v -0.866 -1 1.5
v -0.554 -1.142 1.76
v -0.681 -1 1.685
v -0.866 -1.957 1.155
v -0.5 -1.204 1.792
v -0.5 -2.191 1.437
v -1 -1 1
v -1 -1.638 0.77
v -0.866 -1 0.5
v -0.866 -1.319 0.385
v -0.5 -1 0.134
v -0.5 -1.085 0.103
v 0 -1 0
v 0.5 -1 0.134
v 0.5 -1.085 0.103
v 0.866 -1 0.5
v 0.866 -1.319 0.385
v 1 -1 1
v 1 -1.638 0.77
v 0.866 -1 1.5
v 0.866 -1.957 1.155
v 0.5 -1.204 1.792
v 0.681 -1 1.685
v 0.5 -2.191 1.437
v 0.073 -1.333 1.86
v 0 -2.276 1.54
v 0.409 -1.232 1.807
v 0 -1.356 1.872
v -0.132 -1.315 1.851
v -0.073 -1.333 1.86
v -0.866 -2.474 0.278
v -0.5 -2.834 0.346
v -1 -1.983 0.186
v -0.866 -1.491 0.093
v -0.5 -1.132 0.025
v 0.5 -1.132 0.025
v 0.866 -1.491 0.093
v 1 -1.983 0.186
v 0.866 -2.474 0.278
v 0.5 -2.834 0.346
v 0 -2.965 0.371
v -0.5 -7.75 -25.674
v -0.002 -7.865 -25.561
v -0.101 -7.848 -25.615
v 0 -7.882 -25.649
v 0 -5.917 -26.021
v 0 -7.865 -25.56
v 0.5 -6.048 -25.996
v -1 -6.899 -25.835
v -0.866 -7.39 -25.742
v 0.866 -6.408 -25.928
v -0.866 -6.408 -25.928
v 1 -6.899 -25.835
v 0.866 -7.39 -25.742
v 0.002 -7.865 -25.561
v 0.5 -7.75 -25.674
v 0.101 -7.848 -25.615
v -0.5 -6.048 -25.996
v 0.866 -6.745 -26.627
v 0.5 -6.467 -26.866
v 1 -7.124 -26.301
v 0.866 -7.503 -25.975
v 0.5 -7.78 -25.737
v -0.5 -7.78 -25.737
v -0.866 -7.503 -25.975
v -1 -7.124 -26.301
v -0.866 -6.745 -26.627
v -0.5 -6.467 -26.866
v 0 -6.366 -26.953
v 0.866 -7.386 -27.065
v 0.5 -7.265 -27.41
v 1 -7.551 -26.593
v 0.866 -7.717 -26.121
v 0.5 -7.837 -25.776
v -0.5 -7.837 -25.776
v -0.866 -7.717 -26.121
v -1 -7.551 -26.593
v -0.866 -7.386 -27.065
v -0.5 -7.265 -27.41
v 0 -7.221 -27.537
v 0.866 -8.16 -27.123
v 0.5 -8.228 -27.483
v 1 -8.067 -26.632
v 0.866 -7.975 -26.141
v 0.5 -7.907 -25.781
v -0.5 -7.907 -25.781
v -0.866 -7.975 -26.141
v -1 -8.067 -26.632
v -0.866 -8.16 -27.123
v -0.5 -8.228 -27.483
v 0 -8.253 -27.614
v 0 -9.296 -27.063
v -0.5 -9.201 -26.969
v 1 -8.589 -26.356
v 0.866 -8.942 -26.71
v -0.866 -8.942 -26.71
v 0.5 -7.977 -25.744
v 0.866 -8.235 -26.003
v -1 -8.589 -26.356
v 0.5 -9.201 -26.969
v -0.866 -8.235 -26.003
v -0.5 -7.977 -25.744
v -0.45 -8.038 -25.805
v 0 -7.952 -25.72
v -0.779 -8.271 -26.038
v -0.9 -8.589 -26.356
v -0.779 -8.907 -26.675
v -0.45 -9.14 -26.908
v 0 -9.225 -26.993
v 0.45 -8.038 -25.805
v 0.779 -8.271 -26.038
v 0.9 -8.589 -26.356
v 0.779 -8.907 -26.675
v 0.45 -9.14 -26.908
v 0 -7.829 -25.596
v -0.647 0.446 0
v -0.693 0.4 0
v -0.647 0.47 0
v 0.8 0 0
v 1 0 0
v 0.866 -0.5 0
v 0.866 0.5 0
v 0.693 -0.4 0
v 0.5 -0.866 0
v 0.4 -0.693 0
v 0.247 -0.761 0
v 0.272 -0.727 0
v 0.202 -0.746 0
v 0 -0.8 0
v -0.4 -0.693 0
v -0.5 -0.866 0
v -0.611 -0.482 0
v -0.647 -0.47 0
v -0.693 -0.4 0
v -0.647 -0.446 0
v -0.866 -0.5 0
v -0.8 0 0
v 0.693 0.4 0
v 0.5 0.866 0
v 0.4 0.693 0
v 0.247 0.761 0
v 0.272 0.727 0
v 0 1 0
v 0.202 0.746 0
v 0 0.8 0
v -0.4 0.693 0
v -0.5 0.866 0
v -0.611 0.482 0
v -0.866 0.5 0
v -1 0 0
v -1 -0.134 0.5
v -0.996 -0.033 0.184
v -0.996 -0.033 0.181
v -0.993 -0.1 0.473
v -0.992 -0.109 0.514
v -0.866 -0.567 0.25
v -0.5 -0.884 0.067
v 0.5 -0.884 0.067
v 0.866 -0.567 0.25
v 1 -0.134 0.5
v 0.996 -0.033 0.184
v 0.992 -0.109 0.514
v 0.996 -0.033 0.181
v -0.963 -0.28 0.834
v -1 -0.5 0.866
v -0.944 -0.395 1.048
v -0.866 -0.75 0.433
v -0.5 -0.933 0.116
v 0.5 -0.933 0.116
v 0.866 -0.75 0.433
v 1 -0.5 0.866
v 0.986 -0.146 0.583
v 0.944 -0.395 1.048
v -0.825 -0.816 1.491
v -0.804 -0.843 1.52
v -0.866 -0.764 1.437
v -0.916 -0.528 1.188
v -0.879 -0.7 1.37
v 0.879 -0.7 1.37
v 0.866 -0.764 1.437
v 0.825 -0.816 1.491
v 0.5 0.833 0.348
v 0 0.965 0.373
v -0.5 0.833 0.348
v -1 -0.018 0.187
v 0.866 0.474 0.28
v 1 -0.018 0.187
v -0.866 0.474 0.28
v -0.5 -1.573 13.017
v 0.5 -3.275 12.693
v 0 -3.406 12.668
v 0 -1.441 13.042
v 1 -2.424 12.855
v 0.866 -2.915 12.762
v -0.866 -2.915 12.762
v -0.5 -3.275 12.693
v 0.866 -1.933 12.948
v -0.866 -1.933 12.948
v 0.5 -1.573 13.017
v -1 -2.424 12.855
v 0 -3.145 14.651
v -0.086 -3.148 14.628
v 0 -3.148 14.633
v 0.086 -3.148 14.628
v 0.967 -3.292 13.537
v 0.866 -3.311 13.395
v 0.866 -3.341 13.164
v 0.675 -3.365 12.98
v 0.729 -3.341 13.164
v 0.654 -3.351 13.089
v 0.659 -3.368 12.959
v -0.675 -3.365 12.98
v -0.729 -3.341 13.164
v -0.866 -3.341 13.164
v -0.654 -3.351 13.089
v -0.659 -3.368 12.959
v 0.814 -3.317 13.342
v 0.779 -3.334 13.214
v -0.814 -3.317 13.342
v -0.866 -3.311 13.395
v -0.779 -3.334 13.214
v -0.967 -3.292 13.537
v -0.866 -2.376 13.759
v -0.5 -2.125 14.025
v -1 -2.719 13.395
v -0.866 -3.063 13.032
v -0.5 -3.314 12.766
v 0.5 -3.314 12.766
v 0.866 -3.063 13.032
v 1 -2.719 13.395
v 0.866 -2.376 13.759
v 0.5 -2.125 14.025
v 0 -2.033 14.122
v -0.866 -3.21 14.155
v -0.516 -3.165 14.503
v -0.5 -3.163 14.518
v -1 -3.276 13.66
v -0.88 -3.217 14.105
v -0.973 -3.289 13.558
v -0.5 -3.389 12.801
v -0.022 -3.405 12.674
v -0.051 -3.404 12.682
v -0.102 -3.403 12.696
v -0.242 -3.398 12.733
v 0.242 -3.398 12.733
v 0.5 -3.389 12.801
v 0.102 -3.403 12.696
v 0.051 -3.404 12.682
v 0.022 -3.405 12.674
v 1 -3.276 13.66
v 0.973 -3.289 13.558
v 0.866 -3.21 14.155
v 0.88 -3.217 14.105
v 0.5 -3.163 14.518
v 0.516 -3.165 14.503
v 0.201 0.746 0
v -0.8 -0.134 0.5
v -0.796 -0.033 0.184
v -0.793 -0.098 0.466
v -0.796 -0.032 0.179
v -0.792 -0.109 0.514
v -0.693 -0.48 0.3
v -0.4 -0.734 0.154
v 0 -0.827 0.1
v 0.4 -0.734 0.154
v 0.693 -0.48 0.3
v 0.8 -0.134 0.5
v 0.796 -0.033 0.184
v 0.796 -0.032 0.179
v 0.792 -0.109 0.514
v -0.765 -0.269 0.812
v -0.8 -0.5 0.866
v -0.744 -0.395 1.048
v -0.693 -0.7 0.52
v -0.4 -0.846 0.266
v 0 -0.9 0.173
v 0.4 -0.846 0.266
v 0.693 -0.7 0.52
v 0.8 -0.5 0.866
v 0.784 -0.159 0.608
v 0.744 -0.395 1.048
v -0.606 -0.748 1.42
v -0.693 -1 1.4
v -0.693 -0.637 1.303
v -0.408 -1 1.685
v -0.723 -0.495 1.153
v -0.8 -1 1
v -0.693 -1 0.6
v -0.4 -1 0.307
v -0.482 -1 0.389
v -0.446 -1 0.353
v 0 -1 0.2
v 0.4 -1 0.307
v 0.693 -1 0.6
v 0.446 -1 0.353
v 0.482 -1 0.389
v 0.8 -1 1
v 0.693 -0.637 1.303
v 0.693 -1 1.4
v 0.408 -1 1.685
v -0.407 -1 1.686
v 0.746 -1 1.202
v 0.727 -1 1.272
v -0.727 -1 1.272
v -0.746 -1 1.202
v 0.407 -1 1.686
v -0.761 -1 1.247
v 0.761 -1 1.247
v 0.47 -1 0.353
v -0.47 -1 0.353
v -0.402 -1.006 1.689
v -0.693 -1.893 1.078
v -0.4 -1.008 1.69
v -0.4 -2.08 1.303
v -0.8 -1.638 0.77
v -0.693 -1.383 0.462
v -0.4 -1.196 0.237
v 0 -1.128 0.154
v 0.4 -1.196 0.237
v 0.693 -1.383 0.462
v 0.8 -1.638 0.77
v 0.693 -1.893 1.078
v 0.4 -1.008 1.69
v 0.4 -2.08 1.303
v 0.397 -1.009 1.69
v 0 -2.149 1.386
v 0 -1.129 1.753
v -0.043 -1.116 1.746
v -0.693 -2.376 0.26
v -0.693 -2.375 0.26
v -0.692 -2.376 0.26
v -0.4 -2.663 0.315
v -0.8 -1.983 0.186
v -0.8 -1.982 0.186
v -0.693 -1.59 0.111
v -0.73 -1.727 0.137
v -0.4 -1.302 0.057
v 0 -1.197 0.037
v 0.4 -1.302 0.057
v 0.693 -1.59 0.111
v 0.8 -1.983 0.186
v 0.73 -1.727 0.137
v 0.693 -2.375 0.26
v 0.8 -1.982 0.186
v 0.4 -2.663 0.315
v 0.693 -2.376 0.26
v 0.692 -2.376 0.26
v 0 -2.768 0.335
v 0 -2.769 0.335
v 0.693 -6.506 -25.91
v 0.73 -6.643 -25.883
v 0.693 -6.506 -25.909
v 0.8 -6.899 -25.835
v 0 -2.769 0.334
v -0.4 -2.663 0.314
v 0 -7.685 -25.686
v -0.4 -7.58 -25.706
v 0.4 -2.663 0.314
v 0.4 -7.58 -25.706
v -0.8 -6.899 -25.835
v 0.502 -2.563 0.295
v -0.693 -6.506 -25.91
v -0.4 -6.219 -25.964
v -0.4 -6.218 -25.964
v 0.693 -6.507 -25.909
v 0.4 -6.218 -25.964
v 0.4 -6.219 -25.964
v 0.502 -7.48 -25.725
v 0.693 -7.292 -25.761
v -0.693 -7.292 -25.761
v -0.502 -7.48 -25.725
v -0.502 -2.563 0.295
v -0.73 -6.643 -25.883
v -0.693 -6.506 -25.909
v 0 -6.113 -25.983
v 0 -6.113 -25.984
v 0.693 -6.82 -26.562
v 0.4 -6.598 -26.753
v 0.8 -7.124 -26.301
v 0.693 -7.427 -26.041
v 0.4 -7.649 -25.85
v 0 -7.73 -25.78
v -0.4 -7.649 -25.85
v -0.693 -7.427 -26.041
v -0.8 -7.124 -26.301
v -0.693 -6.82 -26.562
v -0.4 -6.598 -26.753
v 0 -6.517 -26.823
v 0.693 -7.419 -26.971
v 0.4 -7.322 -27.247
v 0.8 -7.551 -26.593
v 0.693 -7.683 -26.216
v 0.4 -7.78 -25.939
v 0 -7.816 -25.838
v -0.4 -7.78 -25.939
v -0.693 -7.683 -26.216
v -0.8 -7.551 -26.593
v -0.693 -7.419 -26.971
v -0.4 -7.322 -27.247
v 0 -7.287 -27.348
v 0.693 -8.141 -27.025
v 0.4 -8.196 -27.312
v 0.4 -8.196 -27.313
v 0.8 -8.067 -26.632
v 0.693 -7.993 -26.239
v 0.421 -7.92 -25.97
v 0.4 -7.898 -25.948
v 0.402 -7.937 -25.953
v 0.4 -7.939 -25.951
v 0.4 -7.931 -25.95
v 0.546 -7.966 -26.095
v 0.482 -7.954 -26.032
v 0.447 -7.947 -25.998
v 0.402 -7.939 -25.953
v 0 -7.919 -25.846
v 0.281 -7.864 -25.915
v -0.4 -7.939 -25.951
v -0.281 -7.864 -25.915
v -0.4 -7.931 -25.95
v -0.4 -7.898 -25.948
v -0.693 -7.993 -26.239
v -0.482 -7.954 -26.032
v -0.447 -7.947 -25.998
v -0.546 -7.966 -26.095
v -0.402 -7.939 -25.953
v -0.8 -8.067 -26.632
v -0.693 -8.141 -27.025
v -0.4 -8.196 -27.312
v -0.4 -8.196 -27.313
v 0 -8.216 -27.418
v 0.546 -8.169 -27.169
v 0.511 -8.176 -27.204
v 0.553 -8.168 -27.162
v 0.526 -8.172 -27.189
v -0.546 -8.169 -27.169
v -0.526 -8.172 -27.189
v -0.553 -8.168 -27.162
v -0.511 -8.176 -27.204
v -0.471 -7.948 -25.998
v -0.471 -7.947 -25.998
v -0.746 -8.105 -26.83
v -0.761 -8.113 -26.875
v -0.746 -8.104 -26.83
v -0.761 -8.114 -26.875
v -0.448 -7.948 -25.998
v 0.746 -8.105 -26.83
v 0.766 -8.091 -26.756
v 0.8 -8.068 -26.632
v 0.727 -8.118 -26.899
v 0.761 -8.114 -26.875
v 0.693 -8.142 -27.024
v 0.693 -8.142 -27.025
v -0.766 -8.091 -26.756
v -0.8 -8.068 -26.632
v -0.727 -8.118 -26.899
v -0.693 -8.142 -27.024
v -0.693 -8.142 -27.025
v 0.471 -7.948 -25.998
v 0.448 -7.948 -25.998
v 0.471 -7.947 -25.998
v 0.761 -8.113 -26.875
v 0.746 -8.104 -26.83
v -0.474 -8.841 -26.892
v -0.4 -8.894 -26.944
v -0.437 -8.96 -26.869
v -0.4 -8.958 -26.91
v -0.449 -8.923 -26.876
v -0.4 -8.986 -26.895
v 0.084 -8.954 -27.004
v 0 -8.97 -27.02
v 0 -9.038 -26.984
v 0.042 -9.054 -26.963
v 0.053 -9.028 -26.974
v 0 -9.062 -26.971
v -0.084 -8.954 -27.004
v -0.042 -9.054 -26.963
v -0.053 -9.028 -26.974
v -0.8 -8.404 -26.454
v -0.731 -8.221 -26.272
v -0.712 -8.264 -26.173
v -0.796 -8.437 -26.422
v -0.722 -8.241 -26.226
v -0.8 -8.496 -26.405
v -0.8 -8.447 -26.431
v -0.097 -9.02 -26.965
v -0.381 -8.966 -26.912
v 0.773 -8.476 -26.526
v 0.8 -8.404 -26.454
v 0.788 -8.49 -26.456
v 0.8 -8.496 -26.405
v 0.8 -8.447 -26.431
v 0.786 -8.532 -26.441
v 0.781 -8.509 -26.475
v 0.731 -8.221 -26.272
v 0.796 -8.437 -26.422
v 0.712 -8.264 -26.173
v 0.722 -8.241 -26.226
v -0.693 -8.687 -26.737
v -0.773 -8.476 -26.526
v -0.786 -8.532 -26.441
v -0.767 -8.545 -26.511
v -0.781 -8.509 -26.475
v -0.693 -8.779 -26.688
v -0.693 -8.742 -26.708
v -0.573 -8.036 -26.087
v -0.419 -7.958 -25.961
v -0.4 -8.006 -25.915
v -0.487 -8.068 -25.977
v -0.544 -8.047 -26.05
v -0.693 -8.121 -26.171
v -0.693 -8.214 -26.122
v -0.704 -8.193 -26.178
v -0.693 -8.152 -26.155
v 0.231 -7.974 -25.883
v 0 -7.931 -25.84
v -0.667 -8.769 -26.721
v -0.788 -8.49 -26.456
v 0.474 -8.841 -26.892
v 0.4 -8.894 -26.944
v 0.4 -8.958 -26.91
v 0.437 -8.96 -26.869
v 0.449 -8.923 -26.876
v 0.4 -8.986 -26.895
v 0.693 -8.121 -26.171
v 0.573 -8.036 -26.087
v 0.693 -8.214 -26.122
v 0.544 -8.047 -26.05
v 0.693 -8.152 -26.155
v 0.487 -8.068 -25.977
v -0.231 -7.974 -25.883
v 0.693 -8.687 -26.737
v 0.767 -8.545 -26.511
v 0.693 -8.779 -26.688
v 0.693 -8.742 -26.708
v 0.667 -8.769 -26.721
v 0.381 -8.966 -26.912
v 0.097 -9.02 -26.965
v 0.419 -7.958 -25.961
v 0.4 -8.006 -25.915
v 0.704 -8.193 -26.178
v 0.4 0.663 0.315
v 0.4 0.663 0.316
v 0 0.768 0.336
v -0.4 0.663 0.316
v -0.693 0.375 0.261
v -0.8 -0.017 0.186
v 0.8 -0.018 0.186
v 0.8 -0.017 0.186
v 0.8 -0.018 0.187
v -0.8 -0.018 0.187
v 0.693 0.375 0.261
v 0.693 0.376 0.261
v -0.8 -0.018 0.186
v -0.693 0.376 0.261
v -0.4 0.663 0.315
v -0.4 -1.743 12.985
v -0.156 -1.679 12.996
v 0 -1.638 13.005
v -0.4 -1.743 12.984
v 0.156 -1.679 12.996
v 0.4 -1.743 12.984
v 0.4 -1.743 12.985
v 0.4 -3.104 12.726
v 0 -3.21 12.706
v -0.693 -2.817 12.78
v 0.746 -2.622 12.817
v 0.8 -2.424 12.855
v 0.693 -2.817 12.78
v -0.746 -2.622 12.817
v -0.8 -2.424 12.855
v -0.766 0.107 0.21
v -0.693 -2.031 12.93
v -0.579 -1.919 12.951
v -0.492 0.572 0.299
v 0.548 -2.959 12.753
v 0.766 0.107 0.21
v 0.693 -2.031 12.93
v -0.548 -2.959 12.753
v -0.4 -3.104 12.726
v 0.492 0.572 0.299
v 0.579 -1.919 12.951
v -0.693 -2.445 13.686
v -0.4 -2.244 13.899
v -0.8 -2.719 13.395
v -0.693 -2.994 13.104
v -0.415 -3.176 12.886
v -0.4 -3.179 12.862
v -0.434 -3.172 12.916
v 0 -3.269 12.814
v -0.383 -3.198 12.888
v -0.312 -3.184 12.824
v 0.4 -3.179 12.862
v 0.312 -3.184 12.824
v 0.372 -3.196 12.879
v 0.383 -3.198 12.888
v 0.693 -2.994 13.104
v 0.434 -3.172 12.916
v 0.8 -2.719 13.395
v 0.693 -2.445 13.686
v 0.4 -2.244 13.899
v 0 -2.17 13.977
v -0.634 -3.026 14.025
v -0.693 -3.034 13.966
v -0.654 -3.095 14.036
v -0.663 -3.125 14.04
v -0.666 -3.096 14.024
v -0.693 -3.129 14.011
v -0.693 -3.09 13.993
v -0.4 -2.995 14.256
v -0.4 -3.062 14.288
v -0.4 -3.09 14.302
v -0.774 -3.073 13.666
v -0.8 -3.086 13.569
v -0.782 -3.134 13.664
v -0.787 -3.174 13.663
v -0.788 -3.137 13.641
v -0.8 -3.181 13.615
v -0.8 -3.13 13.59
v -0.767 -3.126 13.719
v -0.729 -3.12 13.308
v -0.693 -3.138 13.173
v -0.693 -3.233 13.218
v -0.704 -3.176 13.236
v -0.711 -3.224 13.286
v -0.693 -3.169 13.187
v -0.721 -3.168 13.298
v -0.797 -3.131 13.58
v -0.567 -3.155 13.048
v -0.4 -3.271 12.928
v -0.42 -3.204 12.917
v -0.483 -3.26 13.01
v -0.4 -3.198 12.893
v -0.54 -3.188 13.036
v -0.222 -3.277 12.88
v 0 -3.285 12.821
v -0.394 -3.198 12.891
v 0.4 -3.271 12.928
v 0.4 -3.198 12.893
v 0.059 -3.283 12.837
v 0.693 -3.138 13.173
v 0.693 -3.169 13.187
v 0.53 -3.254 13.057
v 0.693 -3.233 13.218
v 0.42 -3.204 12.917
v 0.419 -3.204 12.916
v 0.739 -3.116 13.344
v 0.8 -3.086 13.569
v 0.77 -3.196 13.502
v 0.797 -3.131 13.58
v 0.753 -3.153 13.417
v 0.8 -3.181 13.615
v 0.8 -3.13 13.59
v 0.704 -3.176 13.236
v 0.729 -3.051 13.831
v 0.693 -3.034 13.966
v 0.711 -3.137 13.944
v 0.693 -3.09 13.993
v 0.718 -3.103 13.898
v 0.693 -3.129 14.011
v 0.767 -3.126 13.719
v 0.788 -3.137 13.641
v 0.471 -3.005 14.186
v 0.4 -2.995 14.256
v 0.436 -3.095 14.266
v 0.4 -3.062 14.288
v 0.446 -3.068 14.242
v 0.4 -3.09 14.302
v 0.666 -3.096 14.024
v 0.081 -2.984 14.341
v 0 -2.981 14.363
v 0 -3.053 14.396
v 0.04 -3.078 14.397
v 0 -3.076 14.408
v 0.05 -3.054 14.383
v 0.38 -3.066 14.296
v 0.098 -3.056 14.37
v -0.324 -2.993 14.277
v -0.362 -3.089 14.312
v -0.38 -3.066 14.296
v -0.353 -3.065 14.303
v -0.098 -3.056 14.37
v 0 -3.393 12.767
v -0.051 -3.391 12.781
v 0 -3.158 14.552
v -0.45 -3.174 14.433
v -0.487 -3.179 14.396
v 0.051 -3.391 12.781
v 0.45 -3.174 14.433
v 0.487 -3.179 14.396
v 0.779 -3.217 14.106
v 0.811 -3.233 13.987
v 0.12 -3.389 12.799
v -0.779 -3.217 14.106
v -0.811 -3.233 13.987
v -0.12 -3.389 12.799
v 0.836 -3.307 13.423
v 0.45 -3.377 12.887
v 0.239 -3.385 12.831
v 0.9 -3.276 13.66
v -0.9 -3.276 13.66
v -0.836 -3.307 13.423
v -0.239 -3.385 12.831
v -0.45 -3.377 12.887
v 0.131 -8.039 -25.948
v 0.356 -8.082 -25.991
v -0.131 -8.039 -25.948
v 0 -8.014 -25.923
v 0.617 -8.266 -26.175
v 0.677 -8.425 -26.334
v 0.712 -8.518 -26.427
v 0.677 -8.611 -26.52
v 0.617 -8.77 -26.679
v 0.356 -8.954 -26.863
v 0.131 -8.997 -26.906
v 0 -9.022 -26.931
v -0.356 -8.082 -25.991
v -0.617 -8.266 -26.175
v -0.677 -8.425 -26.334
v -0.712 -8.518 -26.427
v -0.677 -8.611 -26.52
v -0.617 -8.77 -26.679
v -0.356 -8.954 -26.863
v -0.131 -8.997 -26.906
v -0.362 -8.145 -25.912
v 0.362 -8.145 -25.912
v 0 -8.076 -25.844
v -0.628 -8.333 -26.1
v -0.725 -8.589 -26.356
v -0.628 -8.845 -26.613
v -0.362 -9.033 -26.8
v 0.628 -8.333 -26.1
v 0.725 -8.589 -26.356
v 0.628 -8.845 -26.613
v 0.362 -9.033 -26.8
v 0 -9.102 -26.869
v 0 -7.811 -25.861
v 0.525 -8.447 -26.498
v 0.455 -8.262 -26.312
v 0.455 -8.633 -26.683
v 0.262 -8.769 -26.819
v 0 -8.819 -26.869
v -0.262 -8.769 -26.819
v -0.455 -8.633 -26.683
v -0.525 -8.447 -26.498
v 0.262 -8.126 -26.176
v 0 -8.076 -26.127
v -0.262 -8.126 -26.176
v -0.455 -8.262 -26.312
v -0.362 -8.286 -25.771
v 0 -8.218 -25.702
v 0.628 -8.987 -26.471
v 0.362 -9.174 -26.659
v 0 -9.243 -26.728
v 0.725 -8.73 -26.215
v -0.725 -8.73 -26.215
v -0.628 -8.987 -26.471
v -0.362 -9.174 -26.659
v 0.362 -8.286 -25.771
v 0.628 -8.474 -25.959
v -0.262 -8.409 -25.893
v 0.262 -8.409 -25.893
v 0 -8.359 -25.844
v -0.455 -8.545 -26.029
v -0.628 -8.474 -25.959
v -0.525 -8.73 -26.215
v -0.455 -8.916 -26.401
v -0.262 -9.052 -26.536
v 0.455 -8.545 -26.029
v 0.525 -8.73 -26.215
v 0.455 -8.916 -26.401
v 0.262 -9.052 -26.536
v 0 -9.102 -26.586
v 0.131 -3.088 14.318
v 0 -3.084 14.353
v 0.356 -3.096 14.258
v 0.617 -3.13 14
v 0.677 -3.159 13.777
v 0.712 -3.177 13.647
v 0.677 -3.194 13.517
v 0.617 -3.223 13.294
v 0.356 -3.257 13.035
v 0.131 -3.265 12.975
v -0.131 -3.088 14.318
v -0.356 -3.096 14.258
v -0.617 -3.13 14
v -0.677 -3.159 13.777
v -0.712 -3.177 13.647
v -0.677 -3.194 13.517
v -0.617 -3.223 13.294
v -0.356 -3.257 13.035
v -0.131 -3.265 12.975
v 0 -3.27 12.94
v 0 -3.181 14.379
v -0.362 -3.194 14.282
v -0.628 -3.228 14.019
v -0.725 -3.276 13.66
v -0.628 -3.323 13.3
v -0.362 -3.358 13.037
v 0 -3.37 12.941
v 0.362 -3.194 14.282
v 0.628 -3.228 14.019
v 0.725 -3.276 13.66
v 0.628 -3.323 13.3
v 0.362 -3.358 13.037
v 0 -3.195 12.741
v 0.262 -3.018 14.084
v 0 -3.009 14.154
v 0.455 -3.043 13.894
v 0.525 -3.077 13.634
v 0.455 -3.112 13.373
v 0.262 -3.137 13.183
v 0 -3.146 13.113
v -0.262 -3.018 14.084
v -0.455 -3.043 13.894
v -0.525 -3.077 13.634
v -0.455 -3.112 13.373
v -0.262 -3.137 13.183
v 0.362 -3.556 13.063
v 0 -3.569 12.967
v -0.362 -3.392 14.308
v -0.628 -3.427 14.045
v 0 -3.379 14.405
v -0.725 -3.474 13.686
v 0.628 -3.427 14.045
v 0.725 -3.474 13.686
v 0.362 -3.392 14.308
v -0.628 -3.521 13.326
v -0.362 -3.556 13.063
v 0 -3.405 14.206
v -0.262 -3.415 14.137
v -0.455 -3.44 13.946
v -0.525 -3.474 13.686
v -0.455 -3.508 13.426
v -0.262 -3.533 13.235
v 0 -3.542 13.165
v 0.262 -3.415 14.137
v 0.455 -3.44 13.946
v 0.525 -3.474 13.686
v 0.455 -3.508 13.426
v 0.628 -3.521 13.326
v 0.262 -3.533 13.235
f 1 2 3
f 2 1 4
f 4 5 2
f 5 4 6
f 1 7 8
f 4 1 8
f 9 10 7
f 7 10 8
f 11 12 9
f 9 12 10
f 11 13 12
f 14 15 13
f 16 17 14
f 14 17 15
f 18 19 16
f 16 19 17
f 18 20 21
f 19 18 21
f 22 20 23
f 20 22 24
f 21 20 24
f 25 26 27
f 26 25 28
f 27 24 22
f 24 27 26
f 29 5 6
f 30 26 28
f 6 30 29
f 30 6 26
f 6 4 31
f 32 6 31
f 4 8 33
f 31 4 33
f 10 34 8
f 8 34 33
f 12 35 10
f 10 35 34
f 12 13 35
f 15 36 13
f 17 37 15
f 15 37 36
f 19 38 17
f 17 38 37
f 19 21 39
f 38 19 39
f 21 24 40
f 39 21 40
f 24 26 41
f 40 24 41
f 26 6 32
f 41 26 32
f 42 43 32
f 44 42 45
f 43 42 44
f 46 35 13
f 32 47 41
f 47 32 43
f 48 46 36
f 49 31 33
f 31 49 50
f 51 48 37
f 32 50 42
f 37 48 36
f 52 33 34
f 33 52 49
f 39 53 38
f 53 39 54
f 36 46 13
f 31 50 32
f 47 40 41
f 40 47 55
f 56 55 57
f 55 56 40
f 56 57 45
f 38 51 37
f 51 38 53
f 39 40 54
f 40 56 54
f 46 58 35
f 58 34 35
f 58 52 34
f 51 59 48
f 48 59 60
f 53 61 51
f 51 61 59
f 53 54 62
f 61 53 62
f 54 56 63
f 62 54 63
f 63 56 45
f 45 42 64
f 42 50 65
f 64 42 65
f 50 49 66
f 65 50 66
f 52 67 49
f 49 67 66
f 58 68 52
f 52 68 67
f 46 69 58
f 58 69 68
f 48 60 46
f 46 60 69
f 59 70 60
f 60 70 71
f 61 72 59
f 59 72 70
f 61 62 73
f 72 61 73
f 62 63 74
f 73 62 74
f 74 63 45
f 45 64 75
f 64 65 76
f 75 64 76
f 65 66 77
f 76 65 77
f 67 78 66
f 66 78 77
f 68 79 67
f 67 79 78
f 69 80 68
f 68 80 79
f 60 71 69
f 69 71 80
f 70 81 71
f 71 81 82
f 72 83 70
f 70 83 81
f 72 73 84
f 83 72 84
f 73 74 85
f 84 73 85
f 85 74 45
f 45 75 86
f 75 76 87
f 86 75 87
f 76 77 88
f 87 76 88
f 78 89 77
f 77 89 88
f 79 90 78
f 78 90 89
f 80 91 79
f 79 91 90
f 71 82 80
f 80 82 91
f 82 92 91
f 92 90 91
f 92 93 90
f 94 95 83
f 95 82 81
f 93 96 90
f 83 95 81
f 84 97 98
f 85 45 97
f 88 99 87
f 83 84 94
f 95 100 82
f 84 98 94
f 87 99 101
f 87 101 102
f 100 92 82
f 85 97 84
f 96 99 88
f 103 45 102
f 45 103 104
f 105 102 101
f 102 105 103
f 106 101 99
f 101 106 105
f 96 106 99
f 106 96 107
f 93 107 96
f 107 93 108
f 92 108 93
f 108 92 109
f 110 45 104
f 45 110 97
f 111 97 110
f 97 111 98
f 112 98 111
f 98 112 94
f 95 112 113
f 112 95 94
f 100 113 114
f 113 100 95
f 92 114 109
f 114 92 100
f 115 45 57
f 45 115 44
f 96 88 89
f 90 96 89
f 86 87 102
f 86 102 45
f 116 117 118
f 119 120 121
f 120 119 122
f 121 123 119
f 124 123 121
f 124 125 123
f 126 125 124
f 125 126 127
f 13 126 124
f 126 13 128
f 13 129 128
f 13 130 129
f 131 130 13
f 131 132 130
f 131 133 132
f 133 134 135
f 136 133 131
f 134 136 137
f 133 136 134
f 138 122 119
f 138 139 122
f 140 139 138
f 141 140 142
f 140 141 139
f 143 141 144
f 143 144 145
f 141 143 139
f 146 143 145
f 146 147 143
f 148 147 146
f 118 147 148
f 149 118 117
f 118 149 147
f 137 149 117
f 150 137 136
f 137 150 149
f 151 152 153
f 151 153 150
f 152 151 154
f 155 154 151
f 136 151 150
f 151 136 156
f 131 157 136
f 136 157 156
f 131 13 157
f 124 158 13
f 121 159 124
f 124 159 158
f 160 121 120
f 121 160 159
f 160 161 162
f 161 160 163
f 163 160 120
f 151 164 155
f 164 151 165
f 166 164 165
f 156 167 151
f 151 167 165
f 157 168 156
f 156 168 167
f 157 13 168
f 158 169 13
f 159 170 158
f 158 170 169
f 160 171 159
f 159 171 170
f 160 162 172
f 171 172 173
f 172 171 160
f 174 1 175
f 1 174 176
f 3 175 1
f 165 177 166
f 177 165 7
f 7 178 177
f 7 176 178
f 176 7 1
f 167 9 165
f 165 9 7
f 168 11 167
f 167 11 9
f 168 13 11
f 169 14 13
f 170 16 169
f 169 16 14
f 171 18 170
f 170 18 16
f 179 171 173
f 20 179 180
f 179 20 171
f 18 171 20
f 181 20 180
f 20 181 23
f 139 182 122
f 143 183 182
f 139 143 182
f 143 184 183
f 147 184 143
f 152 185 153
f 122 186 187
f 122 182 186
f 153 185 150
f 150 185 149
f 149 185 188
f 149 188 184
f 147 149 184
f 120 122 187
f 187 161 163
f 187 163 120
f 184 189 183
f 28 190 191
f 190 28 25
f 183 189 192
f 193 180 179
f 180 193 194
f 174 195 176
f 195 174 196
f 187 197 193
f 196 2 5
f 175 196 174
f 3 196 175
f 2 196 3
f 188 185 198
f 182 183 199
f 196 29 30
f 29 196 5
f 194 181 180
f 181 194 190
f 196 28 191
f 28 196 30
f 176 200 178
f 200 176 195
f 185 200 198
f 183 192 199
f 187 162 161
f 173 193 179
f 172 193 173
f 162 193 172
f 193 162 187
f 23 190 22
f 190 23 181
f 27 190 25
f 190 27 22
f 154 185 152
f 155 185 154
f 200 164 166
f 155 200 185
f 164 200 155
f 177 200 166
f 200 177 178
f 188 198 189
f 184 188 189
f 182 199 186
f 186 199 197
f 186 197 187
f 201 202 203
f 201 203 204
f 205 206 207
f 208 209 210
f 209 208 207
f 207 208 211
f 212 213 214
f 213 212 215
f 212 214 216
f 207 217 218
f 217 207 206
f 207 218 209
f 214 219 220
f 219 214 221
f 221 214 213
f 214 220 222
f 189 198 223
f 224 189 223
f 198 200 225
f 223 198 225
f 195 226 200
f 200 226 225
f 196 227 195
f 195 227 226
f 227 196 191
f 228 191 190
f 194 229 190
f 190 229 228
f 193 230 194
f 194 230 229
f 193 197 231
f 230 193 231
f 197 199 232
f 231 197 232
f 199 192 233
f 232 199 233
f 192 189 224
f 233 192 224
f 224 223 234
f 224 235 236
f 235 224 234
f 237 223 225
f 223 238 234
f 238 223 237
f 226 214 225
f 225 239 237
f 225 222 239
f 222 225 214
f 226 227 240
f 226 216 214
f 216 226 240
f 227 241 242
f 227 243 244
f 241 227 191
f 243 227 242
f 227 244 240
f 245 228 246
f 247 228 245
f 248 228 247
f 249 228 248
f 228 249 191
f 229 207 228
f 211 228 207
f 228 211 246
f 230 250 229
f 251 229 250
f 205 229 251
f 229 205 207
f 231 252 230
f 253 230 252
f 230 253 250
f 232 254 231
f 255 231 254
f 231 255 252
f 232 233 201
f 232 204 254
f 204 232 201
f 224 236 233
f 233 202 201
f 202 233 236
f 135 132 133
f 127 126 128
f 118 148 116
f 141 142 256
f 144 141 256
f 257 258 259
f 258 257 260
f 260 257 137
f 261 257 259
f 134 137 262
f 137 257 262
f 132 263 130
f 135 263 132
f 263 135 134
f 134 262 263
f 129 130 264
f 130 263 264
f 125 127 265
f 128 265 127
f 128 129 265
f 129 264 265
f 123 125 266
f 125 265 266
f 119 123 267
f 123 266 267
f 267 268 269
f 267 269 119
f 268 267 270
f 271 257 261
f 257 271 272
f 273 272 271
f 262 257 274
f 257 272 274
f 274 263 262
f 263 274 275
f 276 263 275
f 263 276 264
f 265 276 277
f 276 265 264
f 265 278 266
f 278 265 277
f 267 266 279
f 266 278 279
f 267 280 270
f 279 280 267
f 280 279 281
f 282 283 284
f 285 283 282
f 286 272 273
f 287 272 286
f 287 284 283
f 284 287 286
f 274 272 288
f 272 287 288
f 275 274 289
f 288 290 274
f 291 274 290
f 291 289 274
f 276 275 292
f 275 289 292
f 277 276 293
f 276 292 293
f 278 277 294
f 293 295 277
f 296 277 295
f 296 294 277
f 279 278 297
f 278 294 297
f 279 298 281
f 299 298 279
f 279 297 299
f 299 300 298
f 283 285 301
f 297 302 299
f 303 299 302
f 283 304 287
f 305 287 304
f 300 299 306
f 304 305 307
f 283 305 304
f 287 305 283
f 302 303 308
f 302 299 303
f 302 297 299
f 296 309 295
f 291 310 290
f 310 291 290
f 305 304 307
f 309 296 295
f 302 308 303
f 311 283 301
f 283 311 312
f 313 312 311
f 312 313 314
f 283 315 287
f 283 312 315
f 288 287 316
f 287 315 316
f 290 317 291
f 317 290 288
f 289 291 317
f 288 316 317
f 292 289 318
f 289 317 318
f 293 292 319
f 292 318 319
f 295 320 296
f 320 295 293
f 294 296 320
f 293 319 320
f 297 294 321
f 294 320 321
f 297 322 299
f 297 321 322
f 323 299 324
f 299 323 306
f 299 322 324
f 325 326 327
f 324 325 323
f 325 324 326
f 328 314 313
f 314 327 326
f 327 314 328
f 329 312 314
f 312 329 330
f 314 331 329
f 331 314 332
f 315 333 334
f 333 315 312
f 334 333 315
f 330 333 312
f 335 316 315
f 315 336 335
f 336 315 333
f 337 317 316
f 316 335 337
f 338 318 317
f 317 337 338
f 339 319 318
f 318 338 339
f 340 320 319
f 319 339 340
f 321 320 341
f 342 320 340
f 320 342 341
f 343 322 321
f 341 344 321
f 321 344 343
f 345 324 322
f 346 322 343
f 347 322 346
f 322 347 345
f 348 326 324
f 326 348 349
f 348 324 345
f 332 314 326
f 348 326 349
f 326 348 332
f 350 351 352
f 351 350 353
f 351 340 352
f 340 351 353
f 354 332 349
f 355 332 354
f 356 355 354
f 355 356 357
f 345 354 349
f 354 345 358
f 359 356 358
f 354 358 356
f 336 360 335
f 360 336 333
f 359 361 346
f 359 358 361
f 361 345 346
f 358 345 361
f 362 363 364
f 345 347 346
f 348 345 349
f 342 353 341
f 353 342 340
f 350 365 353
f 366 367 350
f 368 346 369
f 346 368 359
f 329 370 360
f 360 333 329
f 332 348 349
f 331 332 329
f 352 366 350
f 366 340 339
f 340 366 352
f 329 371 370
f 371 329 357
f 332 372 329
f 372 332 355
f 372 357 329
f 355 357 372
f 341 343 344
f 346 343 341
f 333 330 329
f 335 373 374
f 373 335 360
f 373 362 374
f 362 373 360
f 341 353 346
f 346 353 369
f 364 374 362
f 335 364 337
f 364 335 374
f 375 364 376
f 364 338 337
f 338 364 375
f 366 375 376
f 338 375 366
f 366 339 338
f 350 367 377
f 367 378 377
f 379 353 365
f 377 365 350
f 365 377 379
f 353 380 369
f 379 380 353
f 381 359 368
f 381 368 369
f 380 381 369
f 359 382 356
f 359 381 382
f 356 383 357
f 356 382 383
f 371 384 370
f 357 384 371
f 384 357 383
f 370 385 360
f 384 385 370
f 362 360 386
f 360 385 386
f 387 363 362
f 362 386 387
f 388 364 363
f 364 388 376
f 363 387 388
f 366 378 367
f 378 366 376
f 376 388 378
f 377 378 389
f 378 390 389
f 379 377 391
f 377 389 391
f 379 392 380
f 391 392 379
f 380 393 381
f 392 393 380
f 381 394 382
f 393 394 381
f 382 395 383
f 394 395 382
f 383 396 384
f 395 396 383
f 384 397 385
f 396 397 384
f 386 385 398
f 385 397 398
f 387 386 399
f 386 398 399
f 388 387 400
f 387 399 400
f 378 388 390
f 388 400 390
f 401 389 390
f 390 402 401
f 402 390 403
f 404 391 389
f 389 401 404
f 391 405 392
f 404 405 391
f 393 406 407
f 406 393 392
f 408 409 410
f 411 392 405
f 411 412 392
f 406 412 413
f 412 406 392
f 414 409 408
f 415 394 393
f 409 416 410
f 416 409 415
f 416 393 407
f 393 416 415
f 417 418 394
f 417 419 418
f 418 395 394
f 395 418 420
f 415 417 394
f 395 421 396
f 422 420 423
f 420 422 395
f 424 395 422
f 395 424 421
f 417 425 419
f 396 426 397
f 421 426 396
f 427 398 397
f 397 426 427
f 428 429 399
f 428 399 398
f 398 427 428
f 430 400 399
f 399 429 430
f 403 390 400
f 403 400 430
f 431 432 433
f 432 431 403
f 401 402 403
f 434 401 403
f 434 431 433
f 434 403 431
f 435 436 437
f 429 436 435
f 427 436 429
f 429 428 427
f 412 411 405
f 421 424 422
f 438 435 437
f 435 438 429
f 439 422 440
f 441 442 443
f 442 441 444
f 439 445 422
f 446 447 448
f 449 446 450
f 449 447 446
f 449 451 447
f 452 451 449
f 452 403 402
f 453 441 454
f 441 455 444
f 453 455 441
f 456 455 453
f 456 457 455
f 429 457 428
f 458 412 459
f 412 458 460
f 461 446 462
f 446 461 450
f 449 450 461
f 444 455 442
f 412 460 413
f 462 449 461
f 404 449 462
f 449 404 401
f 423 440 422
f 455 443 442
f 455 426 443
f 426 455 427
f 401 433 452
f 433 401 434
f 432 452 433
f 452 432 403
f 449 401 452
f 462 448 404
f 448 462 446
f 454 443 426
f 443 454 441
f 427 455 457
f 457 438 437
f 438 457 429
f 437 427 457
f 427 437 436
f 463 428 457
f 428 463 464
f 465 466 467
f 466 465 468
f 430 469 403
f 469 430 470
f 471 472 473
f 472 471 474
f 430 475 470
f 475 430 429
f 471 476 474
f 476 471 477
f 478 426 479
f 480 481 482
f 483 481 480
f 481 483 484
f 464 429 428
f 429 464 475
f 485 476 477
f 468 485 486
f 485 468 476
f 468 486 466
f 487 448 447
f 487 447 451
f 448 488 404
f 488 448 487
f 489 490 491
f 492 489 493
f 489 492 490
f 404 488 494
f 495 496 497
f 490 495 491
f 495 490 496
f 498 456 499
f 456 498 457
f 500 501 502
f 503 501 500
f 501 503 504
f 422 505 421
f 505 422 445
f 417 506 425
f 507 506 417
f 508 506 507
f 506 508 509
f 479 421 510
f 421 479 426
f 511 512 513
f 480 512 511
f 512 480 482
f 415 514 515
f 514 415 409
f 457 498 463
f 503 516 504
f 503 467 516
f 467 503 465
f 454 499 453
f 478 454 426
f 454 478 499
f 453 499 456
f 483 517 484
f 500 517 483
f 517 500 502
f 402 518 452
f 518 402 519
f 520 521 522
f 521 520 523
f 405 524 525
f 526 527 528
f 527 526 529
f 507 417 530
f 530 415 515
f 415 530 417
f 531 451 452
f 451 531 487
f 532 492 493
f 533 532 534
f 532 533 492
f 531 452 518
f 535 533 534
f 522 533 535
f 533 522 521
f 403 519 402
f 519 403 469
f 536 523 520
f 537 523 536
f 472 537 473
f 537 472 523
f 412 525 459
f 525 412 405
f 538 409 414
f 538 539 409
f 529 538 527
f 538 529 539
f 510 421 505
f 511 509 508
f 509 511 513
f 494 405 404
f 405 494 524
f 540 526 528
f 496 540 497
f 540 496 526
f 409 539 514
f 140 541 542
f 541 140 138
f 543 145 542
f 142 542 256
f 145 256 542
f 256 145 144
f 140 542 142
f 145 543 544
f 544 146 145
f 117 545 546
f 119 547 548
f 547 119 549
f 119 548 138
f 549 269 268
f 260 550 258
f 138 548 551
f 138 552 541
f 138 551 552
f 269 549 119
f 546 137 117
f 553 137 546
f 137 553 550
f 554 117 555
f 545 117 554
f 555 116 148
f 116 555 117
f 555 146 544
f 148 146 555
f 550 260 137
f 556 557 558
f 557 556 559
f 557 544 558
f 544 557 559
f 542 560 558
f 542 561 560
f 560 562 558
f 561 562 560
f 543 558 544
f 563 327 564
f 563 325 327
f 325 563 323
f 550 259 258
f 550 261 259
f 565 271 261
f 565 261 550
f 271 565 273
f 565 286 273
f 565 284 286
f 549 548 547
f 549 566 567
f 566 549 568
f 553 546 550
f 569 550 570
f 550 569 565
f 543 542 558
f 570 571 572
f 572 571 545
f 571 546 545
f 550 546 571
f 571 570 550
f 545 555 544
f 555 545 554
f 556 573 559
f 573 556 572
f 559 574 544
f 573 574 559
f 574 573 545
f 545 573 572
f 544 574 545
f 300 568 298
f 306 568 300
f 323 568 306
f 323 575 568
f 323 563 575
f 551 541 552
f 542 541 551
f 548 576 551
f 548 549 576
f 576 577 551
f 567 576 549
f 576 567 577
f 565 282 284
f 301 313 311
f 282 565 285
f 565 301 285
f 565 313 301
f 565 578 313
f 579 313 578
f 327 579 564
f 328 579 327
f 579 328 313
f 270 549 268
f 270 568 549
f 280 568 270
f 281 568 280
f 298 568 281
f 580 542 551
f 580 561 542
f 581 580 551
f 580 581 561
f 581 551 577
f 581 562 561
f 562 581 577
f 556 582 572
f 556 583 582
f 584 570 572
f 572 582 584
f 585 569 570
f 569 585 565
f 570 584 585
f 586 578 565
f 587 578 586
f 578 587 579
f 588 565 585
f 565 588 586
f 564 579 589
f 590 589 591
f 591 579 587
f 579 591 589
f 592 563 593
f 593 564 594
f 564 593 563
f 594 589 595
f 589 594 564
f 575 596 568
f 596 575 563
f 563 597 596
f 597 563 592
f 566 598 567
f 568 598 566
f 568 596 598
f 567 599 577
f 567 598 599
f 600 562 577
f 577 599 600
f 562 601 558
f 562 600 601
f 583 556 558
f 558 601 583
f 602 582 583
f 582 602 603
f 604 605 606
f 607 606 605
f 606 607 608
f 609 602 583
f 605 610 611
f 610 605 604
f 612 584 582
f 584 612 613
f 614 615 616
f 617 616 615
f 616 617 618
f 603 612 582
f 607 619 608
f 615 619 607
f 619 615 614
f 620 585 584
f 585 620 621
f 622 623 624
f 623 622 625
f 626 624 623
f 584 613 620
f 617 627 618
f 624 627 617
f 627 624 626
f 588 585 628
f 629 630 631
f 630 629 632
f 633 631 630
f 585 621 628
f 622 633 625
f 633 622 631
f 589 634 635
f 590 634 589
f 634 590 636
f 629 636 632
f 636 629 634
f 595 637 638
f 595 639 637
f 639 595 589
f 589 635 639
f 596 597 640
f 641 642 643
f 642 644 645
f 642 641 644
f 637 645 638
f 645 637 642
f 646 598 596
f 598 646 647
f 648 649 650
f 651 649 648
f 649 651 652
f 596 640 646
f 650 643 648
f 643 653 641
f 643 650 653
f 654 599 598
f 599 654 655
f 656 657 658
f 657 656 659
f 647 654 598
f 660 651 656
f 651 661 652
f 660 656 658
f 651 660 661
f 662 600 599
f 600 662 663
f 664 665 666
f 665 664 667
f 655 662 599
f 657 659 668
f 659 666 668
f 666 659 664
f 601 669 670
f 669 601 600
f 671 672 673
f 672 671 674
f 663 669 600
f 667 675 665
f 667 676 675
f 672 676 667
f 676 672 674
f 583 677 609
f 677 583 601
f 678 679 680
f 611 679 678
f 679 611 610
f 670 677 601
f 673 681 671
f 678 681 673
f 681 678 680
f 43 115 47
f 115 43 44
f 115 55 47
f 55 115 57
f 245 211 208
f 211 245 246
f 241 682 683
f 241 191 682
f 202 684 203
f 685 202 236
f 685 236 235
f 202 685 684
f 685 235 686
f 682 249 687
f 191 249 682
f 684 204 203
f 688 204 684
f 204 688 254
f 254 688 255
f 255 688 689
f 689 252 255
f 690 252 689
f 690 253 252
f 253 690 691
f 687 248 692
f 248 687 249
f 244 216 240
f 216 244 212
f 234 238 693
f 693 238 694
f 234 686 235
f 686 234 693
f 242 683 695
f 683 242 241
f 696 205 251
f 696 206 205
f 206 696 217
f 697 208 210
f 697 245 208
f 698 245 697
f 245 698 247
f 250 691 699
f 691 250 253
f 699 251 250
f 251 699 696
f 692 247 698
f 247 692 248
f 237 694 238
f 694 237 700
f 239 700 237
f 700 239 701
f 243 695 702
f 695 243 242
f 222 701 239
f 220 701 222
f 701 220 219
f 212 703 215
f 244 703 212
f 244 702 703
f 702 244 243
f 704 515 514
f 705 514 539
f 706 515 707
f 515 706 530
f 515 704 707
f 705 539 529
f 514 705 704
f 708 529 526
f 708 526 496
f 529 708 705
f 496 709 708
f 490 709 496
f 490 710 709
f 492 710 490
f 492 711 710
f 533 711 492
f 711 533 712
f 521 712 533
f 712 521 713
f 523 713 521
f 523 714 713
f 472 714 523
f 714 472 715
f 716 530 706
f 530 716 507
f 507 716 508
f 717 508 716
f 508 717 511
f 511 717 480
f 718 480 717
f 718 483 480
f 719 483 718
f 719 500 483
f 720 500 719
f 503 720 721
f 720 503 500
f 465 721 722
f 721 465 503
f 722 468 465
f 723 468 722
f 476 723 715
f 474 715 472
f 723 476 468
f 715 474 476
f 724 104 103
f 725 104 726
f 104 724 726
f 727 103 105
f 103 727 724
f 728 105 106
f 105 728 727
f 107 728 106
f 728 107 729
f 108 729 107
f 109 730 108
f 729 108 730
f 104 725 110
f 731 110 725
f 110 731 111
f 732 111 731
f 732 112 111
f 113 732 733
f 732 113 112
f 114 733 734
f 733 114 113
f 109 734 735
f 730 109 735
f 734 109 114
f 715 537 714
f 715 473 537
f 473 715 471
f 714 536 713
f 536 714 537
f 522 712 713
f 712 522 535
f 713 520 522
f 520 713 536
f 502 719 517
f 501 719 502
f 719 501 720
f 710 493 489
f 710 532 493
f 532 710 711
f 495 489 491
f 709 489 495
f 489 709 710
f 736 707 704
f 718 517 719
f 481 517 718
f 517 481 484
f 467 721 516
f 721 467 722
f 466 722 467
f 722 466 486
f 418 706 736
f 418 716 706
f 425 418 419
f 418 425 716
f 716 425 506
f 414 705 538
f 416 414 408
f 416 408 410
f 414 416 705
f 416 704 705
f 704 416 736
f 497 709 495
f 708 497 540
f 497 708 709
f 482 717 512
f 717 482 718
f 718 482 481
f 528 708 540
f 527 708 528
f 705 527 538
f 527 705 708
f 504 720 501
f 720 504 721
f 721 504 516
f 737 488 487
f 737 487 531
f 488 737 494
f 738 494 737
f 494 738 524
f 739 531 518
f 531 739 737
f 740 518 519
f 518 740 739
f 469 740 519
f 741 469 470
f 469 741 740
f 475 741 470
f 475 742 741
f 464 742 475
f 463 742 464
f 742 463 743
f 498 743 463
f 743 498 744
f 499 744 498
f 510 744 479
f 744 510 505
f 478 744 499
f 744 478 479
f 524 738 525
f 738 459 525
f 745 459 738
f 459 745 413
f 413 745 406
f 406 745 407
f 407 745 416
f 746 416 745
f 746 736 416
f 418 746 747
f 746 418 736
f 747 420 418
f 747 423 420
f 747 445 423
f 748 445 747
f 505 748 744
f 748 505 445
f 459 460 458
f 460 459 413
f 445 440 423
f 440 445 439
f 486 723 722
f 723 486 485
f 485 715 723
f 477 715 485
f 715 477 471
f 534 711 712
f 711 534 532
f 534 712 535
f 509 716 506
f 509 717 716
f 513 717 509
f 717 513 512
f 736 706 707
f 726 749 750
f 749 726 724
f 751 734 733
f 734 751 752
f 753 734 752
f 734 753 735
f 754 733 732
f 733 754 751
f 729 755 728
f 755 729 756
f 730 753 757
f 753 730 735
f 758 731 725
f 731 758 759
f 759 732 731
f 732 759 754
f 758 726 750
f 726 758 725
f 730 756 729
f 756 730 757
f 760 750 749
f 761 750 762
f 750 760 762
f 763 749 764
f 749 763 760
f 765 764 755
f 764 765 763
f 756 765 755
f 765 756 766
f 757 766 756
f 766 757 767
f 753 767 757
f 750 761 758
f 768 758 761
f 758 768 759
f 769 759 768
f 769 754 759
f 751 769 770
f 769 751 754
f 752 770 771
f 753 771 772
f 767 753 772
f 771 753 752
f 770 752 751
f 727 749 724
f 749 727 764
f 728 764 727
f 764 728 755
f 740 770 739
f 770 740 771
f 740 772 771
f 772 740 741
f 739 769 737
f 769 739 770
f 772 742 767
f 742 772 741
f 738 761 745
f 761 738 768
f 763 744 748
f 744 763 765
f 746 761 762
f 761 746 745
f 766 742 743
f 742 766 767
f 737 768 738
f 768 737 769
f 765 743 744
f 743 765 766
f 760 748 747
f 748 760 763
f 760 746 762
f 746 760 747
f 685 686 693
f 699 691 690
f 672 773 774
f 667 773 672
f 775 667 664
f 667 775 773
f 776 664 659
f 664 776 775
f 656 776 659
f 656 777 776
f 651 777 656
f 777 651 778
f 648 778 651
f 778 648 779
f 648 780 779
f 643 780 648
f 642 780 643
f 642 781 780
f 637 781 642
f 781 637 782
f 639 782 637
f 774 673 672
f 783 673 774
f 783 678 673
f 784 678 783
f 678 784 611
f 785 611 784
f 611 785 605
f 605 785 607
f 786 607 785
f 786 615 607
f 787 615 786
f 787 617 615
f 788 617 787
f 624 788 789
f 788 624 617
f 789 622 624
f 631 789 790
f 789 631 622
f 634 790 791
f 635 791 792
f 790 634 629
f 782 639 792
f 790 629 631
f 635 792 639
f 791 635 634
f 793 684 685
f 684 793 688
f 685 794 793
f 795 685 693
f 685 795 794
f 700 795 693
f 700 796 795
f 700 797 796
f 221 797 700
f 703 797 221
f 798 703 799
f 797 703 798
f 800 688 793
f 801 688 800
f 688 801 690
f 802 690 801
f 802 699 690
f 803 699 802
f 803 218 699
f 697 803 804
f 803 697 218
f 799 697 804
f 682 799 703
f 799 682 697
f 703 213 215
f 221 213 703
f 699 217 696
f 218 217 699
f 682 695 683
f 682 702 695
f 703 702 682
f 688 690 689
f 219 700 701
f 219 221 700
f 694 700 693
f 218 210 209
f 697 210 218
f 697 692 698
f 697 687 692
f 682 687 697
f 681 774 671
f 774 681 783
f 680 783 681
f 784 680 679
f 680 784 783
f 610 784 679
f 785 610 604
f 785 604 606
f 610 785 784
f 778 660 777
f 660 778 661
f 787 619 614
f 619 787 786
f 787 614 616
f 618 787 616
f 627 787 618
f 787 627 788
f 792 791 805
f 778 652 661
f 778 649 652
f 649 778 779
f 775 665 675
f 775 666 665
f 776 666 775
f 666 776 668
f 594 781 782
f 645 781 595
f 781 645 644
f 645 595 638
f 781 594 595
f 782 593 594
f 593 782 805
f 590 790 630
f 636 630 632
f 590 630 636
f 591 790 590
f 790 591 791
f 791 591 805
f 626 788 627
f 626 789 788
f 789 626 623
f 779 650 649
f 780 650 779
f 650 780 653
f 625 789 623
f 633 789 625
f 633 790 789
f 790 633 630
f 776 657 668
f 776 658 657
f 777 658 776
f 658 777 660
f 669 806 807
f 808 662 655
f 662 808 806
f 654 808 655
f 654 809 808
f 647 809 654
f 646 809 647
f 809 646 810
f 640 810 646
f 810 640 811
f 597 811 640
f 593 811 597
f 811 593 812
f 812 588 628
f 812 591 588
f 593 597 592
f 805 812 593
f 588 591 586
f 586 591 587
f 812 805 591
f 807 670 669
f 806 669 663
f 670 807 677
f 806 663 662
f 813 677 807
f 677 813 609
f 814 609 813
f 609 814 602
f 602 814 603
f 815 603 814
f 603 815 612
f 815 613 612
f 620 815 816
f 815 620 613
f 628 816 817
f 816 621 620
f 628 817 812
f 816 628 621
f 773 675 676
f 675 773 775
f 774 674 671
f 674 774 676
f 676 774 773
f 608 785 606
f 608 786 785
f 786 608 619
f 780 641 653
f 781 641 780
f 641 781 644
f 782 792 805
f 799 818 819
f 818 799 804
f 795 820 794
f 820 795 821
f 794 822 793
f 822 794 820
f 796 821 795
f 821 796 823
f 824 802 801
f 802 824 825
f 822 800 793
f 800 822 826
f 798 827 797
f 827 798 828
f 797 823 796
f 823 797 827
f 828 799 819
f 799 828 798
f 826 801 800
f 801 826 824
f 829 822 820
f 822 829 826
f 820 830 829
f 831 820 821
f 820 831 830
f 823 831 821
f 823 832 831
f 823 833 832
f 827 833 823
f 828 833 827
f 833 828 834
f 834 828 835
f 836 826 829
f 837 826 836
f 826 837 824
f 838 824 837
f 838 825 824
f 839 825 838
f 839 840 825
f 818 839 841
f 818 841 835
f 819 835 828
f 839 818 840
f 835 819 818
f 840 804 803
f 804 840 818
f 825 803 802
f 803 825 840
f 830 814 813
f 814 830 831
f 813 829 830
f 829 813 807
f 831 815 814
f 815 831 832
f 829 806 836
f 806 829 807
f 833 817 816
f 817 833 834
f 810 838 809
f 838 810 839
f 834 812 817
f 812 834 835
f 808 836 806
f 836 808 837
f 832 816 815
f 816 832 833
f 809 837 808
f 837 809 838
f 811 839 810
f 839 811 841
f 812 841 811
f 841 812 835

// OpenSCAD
tolerance=0.075;
hole_radius=0.05;
grid_hole_radius=0.05;
outer_radius=1;
thickness=0.2;
hole_attach_height=0.05;
attach_thickness=0.1;

//parameters that don't have to be defined explicitly
eps = tolerance/100;
inner_radius = outer_radius - thickness;
fn = 12;
fnh = 6;

module angled_cylinder(angle_deg_y, _h, _r, angle_deg_x = 0) {
    rotate([angle_deg_x, angle_deg_y, 0]) { // Rotate the cylinder 
            cylinder(h = _h, r = _r, center = true, $fn = fnh);
        }
}

module hole(_h) {
    cylinder(h = _h, r = grid_hole_radius, $fn = fnh);
}

//makes circle of holes
module circular_grid(_h, _r, _n) {
    for (i = [0:_n-1]) {
        angle = i * 360 / _n;
        x_pos = _r * cos(angle);
        y_pos = _r * sin(angle);
        translate([x_pos, y_pos, -eps]) {
            hole(_h);
        }
    }
}

//makes grid of holes
module hole_grid(hole_height, grid_h) {
    translate([0,0,hole_height]) {
        difference() {
            //cylinder
            cylinder(h = grid_h, r = (inner_radius + outer_radius)/2, 
                center=false, $fn = fn);
            //holes
            for (i = [0 : grid_hole_radius * 2 + hole_attach_height : inner_radius - grid_hole_radius * 2]) {
                circular_grid(grid_h + eps*2, i, ceil(6.28*i/(grid_hole_radius*4)));
            }
            
        } 
    }
}

//makes curve of CSC
module curve(_radius, _twist, _turning_angle, _turning_radius) {
    rotate([90,0,_twist])
    translate([-_turning_radius, 0, 0])
    rotate_extrude(angle=_turning_angle, convexity=100, $fn = fn)
    translate([_turning_radius, 0]) circle(_radius);
}

module CSC(_r, _t1, _ta1, _tr1, _h, _t2, _ta2, _tr2, is_inner) {
    
    if (_ta1 > 90) {
        CSC(_r, _t1, 90, _tr1, 0, 0, 0, 0, is_inner);
        
        pos1 = (-_tr1 + sqrt(_tr1*_tr1 - pow(_tr1,2)));
        translate([pos1*cos(_t1),pos1*sin(_t1),_tr1])
        rotate([0,-90,_t1])
        CSC(_r, 0, _ta1 - 90, _tr1, _h, _t2, _ta2, _tr2, is_inner);
    } else if (_ta2 > 90) {
        CSC(_r, _t1, _ta1, _tr1, _h, _t2, 90, _tr2, is_inner);
        
        pos1 = (-_tr1 + sqrt(_tr1*_tr1 - pow(_tr1*sin(_ta1),2)));
        pos2 = (-_tr2 + sqrt(_tr2*_tr2 - pow(_tr2,2)));
        translate([pos1*cos(_t1),pos1*sin(_t1),_tr1*sin(_ta1)])
        rotate([0,-_ta1,_t1])
        translate([0, 0, _h])
        translate([pos2*cos(_t2),pos2*sin(_t2),_tr2])
        rotate([0,-90,_t2])
        CSC(_r, 0, 0, 0, 0, 0, _ta2 - 90, _tr2, is_inner);
    } else {
        //intermediate positions
        pos1 = (-_tr1 + sqrt(_tr1*_tr1 - pow(_tr1*sin(_ta1),2)));
        pos2 = (-_tr2 + sqrt(_tr2*_tr2 - pow(_tr2*sin(_ta2),2)));
        
        union() {
            //bottom shell threshold
            if (is_inner) {
                cylinder(h=eps, r=_r, center=true);
            }
            
            //first curve of CSC
            curve(_r, _t1, _ta1, _tr1);
            
            //straight link of CSC
            translate([pos1*cos(_t1),pos1*sin(_t1),_tr1*sin(_ta1)])
            rotate([0,-_ta1,_t1])
            if (is_inner) {
                //add threshold for shelling
                translate([0,0,-eps /2])
                cylinder(h=_h + eps,r=_r, center = false, $fn= fn);
            } else {
                cylinder(h=_h,r=_r, center = false, $fn= fn);
            }
            
            //second curve of CSC
            translate([pos1*cos(_t1),pos1*sin(_t1),_tr1*sin(_ta1)])
            rotate([0,-_ta1,_t1])
            translate([0, 0, _h])
            curve(_r, _t2, _ta2, _tr2);
            
            //shelling thresholds
            if (is_inner) {
                translate([pos1*cos(_t1),pos1*sin(_t1),_tr1*sin(_ta1)])
                rotate([0,-_ta1,_t1])
                translate([0, 0, _h])
                translate([pos2*cos(_t2),pos2*sin(_t2),_tr2*sin(_ta2)])
                rotate([0,-_ta2,_t2]) {
                    cylinder(h=eps, r=_r, center=true,$fn=fn);
                }
            
            }
        }
    }
    
}

//allow modules to attach
module CSC_ATTACH(_r, _t1, _ta1, _tr1, _h, _t2, _ta2, _tr2, next_hole_radius, next_hole_attach_height, next_inner) {
    
    if (_ta1 > 90) {        
        pos1 = (-_tr1 + sqrt(_tr1*_tr1 - pow(_tr1,2)));
        translate([pos1*cos(_t1),pos1*sin(_t1),_tr1])
        rotate([0,-90,_t1])
        CSC_ATTACH(_r, 0, _ta1 - 90, _tr1, _h, _t2, _ta2, _tr2, next_hole_radius, next_hole_attach_height, next_inner);
    } else if (_ta2 > 90) {        
        pos1 = (-_tr1 + sqrt(_tr1*_tr1 - pow(_tr1*sin(_ta1),2)));
        pos2 = (-_tr2 + sqrt(_tr2*_tr2 - pow(_tr2,2)));
        translate([pos1*cos(_t1),pos1*sin(_t1),_tr1*sin(_ta1)])
        rotate([0,-_ta1,_t1])
        translate([0, 0, _h])
        translate([pos2*cos(_t2),pos2*sin(_t2),_tr2])
        rotate([0,-90,_t2])
        CSC_ATTACH(_r, 0, 0, 0, 0, 0, _ta2 - 90, _tr2, next_hole_radius, next_hole_attach_height, next_inner);
    } else {
        //intermediate positions
        pos1 = (-_tr1 + sqrt(_tr1*_tr1 - pow(_tr1*sin(_ta1),2)));
        pos2 = (-_tr2 + sqrt(_tr2*_tr2 - pow(_tr2*sin(_ta2),2)));
        
        translate([pos1*cos(_t1),pos1*sin(_t1),_tr1*sin(_ta1)])
        rotate([0,-_ta1,_t1])
        translate([0, 0, _h])
        translate([pos2*cos(_t2),pos2*sin(_t2),_tr2*sin(_ta2)])
        rotate([0,-_ta2,_t2]) {
            difference() {
                union() {
                    //attachment for smaller cylinder
                    translate([0,0,-attach_thickness])
                    cylinder(h=attach_thickness, r=_r - thickness/2, $fn=fn);
                    translate([0,0,-attach_thickness*2])
                    cylinder(h=attach_thickness*2, r1=_r - thickness/2, r2=next_inner - tolerance - thickness, $fn=fn);
                    
                    //small cylinder
                    cylinder(h=next_hole_radius*2 + next_hole_attach_height * 2, r = next_inner - tolerance, $fn=fn);
                }
                
                //shelling
                translate([0,0, -attach_thickness*2 - eps/2])
                cylinder(h=next_hole_radius*2 + next_hole_attach_height * 2 + attach_thickness*2 + eps, r = min(inner_radius, next_inner - tolerance - thickness), $fn=fn);
                
                //holes for screws
    //            translate([0,0,next_hole_attach_height + next_hole_radius]) {
    //                angled_cylinder(0, (next_inner + thickness + eps) * 2,  hole_radius, 90);
    //                angled_cylinder(90, (next_inner + thickness + eps) * 2, hole_radius, 0);
    //            }
            }
        }
    }
}

//remove overlap to allow all branches to attach to each other
module CSC_REMOVE_OVERLAP(_r, _t1, _ta1, _tr1, _h, _t2, _ta2, _tr2, next_hole_radius, next_hole_attach_height, next_inner) {
    if (_ta1 > 90) {        
        pos1 = (-_tr1 + sqrt(_tr1*_tr1 - pow(_tr1,2)));
        translate([pos1*cos(_t1),pos1*sin(_t1),_tr1])
        rotate([0,-90,_t1])
        CSC_REMOVE_OVERLAP(_r, 0, _ta1 - 90, _tr1, _h, _t2, _ta2, _tr2, next_hole_radius, next_hole_attach_height, next_inner);
    } else if (_ta2 > 90) {        
        pos1 = (-_tr1 + sqrt(_tr1*_tr1 - pow(_tr1*sin(_ta1),2)));
        pos2 = (-_tr2 + sqrt(_tr2*_tr2 - pow(_tr2,2)));
        translate([pos1*cos(_t1),pos1*sin(_t1),_tr1*sin(_ta1)])
        rotate([0,-_ta1,_t1])
        translate([0, 0, _h])
        translate([pos2*cos(_t2),pos2*sin(_t2),_tr2])
        rotate([0,-90,_t2])
        CSC_REMOVE_OVERLAP(_r, 0, 0, 0, 0, 0, _ta2 - 90, _tr2, next_hole_radius, next_hole_attach_height, next_inner);
    } else {
        pos1 = (-_tr1 + sqrt(_tr1*_tr1 - pow(_tr1*sin(_ta1),2)));
        pos2 = (-_tr2 + sqrt(_tr2*_tr2 - pow(_tr2*sin(_ta2),2)));
        
        translate([pos1*cos(_t1),pos1*sin(_t1),_tr1*sin(_ta1)])
        rotate([0,-_ta1,_t1])
        translate([0, 0, _h])
        translate([pos2*cos(_t2),pos2*sin(_t2),_tr2*sin(_ta2)])
        rotate([0,-_ta2,_t2]) {
            cylinder(h=999999, r=_r + tolerance, $fn=fn);
        }
    }
}

//c is _t1, _ta1, _tr1, _h, _t2, _ta2, _tr2, next hole radius, next hole height, next inner radius
module branch(branch_list, _outer, _inner) {
    union() {
        //make grid of holes
        //hole_grid(hole_radius*2 + hole_attach_height * 2, grid_hole_radius);
        
        //make CSC shells for each CSC in branch_list
        difference() {
            for (c = branch_list) {
                CSC(_outer,c[0],c[1],c[2],c[3],c[4],c[5],c[6], false);
            }
            
            for (c = branch_list) {
                CSC(_inner,c[0],c[1],c[2],c[3],c[4],c[5],c[6], true);
                CSC_REMOVE_OVERLAP(_outer,c[0],c[1],c[2],c[3],c[4],c[5],c[6],c[7], c[8], c[9]);
            }
            
            //make screw holes at the bottom
//            translate([0,0,hole_radius + hole_attach_height]) {
//                angled_cylinder(0, (outer_radius*1.5 + eps) * 2,  hole_radius, 90);
//                angled_cylinder(90, (outer_radius*1.5 + eps) * 2, hole_radius, 0);
//            }    
        }
        for (c=branch_list) {     
            CSC_ATTACH(_outer,c[0],c[1],c[2],c[3],c[4],c[5],c[6], c[7], c[8], c[9]);
        }
    }
}

branch([
[ 90.0, 169.3002, 1.0*outer_radius, 26.481*outer_radius, 180.0, 124.3002, 1.0*outer_radius, 0.05, 0.05, 0.8],
[ 90.0, 10.7545, 1.0*outer_radius, 12.8948*outer_radius, -0.0, 71.7455, 1.0*outer_radius, 0.05, 0.05, 0.8],
],outer_radius,inner_radius);
